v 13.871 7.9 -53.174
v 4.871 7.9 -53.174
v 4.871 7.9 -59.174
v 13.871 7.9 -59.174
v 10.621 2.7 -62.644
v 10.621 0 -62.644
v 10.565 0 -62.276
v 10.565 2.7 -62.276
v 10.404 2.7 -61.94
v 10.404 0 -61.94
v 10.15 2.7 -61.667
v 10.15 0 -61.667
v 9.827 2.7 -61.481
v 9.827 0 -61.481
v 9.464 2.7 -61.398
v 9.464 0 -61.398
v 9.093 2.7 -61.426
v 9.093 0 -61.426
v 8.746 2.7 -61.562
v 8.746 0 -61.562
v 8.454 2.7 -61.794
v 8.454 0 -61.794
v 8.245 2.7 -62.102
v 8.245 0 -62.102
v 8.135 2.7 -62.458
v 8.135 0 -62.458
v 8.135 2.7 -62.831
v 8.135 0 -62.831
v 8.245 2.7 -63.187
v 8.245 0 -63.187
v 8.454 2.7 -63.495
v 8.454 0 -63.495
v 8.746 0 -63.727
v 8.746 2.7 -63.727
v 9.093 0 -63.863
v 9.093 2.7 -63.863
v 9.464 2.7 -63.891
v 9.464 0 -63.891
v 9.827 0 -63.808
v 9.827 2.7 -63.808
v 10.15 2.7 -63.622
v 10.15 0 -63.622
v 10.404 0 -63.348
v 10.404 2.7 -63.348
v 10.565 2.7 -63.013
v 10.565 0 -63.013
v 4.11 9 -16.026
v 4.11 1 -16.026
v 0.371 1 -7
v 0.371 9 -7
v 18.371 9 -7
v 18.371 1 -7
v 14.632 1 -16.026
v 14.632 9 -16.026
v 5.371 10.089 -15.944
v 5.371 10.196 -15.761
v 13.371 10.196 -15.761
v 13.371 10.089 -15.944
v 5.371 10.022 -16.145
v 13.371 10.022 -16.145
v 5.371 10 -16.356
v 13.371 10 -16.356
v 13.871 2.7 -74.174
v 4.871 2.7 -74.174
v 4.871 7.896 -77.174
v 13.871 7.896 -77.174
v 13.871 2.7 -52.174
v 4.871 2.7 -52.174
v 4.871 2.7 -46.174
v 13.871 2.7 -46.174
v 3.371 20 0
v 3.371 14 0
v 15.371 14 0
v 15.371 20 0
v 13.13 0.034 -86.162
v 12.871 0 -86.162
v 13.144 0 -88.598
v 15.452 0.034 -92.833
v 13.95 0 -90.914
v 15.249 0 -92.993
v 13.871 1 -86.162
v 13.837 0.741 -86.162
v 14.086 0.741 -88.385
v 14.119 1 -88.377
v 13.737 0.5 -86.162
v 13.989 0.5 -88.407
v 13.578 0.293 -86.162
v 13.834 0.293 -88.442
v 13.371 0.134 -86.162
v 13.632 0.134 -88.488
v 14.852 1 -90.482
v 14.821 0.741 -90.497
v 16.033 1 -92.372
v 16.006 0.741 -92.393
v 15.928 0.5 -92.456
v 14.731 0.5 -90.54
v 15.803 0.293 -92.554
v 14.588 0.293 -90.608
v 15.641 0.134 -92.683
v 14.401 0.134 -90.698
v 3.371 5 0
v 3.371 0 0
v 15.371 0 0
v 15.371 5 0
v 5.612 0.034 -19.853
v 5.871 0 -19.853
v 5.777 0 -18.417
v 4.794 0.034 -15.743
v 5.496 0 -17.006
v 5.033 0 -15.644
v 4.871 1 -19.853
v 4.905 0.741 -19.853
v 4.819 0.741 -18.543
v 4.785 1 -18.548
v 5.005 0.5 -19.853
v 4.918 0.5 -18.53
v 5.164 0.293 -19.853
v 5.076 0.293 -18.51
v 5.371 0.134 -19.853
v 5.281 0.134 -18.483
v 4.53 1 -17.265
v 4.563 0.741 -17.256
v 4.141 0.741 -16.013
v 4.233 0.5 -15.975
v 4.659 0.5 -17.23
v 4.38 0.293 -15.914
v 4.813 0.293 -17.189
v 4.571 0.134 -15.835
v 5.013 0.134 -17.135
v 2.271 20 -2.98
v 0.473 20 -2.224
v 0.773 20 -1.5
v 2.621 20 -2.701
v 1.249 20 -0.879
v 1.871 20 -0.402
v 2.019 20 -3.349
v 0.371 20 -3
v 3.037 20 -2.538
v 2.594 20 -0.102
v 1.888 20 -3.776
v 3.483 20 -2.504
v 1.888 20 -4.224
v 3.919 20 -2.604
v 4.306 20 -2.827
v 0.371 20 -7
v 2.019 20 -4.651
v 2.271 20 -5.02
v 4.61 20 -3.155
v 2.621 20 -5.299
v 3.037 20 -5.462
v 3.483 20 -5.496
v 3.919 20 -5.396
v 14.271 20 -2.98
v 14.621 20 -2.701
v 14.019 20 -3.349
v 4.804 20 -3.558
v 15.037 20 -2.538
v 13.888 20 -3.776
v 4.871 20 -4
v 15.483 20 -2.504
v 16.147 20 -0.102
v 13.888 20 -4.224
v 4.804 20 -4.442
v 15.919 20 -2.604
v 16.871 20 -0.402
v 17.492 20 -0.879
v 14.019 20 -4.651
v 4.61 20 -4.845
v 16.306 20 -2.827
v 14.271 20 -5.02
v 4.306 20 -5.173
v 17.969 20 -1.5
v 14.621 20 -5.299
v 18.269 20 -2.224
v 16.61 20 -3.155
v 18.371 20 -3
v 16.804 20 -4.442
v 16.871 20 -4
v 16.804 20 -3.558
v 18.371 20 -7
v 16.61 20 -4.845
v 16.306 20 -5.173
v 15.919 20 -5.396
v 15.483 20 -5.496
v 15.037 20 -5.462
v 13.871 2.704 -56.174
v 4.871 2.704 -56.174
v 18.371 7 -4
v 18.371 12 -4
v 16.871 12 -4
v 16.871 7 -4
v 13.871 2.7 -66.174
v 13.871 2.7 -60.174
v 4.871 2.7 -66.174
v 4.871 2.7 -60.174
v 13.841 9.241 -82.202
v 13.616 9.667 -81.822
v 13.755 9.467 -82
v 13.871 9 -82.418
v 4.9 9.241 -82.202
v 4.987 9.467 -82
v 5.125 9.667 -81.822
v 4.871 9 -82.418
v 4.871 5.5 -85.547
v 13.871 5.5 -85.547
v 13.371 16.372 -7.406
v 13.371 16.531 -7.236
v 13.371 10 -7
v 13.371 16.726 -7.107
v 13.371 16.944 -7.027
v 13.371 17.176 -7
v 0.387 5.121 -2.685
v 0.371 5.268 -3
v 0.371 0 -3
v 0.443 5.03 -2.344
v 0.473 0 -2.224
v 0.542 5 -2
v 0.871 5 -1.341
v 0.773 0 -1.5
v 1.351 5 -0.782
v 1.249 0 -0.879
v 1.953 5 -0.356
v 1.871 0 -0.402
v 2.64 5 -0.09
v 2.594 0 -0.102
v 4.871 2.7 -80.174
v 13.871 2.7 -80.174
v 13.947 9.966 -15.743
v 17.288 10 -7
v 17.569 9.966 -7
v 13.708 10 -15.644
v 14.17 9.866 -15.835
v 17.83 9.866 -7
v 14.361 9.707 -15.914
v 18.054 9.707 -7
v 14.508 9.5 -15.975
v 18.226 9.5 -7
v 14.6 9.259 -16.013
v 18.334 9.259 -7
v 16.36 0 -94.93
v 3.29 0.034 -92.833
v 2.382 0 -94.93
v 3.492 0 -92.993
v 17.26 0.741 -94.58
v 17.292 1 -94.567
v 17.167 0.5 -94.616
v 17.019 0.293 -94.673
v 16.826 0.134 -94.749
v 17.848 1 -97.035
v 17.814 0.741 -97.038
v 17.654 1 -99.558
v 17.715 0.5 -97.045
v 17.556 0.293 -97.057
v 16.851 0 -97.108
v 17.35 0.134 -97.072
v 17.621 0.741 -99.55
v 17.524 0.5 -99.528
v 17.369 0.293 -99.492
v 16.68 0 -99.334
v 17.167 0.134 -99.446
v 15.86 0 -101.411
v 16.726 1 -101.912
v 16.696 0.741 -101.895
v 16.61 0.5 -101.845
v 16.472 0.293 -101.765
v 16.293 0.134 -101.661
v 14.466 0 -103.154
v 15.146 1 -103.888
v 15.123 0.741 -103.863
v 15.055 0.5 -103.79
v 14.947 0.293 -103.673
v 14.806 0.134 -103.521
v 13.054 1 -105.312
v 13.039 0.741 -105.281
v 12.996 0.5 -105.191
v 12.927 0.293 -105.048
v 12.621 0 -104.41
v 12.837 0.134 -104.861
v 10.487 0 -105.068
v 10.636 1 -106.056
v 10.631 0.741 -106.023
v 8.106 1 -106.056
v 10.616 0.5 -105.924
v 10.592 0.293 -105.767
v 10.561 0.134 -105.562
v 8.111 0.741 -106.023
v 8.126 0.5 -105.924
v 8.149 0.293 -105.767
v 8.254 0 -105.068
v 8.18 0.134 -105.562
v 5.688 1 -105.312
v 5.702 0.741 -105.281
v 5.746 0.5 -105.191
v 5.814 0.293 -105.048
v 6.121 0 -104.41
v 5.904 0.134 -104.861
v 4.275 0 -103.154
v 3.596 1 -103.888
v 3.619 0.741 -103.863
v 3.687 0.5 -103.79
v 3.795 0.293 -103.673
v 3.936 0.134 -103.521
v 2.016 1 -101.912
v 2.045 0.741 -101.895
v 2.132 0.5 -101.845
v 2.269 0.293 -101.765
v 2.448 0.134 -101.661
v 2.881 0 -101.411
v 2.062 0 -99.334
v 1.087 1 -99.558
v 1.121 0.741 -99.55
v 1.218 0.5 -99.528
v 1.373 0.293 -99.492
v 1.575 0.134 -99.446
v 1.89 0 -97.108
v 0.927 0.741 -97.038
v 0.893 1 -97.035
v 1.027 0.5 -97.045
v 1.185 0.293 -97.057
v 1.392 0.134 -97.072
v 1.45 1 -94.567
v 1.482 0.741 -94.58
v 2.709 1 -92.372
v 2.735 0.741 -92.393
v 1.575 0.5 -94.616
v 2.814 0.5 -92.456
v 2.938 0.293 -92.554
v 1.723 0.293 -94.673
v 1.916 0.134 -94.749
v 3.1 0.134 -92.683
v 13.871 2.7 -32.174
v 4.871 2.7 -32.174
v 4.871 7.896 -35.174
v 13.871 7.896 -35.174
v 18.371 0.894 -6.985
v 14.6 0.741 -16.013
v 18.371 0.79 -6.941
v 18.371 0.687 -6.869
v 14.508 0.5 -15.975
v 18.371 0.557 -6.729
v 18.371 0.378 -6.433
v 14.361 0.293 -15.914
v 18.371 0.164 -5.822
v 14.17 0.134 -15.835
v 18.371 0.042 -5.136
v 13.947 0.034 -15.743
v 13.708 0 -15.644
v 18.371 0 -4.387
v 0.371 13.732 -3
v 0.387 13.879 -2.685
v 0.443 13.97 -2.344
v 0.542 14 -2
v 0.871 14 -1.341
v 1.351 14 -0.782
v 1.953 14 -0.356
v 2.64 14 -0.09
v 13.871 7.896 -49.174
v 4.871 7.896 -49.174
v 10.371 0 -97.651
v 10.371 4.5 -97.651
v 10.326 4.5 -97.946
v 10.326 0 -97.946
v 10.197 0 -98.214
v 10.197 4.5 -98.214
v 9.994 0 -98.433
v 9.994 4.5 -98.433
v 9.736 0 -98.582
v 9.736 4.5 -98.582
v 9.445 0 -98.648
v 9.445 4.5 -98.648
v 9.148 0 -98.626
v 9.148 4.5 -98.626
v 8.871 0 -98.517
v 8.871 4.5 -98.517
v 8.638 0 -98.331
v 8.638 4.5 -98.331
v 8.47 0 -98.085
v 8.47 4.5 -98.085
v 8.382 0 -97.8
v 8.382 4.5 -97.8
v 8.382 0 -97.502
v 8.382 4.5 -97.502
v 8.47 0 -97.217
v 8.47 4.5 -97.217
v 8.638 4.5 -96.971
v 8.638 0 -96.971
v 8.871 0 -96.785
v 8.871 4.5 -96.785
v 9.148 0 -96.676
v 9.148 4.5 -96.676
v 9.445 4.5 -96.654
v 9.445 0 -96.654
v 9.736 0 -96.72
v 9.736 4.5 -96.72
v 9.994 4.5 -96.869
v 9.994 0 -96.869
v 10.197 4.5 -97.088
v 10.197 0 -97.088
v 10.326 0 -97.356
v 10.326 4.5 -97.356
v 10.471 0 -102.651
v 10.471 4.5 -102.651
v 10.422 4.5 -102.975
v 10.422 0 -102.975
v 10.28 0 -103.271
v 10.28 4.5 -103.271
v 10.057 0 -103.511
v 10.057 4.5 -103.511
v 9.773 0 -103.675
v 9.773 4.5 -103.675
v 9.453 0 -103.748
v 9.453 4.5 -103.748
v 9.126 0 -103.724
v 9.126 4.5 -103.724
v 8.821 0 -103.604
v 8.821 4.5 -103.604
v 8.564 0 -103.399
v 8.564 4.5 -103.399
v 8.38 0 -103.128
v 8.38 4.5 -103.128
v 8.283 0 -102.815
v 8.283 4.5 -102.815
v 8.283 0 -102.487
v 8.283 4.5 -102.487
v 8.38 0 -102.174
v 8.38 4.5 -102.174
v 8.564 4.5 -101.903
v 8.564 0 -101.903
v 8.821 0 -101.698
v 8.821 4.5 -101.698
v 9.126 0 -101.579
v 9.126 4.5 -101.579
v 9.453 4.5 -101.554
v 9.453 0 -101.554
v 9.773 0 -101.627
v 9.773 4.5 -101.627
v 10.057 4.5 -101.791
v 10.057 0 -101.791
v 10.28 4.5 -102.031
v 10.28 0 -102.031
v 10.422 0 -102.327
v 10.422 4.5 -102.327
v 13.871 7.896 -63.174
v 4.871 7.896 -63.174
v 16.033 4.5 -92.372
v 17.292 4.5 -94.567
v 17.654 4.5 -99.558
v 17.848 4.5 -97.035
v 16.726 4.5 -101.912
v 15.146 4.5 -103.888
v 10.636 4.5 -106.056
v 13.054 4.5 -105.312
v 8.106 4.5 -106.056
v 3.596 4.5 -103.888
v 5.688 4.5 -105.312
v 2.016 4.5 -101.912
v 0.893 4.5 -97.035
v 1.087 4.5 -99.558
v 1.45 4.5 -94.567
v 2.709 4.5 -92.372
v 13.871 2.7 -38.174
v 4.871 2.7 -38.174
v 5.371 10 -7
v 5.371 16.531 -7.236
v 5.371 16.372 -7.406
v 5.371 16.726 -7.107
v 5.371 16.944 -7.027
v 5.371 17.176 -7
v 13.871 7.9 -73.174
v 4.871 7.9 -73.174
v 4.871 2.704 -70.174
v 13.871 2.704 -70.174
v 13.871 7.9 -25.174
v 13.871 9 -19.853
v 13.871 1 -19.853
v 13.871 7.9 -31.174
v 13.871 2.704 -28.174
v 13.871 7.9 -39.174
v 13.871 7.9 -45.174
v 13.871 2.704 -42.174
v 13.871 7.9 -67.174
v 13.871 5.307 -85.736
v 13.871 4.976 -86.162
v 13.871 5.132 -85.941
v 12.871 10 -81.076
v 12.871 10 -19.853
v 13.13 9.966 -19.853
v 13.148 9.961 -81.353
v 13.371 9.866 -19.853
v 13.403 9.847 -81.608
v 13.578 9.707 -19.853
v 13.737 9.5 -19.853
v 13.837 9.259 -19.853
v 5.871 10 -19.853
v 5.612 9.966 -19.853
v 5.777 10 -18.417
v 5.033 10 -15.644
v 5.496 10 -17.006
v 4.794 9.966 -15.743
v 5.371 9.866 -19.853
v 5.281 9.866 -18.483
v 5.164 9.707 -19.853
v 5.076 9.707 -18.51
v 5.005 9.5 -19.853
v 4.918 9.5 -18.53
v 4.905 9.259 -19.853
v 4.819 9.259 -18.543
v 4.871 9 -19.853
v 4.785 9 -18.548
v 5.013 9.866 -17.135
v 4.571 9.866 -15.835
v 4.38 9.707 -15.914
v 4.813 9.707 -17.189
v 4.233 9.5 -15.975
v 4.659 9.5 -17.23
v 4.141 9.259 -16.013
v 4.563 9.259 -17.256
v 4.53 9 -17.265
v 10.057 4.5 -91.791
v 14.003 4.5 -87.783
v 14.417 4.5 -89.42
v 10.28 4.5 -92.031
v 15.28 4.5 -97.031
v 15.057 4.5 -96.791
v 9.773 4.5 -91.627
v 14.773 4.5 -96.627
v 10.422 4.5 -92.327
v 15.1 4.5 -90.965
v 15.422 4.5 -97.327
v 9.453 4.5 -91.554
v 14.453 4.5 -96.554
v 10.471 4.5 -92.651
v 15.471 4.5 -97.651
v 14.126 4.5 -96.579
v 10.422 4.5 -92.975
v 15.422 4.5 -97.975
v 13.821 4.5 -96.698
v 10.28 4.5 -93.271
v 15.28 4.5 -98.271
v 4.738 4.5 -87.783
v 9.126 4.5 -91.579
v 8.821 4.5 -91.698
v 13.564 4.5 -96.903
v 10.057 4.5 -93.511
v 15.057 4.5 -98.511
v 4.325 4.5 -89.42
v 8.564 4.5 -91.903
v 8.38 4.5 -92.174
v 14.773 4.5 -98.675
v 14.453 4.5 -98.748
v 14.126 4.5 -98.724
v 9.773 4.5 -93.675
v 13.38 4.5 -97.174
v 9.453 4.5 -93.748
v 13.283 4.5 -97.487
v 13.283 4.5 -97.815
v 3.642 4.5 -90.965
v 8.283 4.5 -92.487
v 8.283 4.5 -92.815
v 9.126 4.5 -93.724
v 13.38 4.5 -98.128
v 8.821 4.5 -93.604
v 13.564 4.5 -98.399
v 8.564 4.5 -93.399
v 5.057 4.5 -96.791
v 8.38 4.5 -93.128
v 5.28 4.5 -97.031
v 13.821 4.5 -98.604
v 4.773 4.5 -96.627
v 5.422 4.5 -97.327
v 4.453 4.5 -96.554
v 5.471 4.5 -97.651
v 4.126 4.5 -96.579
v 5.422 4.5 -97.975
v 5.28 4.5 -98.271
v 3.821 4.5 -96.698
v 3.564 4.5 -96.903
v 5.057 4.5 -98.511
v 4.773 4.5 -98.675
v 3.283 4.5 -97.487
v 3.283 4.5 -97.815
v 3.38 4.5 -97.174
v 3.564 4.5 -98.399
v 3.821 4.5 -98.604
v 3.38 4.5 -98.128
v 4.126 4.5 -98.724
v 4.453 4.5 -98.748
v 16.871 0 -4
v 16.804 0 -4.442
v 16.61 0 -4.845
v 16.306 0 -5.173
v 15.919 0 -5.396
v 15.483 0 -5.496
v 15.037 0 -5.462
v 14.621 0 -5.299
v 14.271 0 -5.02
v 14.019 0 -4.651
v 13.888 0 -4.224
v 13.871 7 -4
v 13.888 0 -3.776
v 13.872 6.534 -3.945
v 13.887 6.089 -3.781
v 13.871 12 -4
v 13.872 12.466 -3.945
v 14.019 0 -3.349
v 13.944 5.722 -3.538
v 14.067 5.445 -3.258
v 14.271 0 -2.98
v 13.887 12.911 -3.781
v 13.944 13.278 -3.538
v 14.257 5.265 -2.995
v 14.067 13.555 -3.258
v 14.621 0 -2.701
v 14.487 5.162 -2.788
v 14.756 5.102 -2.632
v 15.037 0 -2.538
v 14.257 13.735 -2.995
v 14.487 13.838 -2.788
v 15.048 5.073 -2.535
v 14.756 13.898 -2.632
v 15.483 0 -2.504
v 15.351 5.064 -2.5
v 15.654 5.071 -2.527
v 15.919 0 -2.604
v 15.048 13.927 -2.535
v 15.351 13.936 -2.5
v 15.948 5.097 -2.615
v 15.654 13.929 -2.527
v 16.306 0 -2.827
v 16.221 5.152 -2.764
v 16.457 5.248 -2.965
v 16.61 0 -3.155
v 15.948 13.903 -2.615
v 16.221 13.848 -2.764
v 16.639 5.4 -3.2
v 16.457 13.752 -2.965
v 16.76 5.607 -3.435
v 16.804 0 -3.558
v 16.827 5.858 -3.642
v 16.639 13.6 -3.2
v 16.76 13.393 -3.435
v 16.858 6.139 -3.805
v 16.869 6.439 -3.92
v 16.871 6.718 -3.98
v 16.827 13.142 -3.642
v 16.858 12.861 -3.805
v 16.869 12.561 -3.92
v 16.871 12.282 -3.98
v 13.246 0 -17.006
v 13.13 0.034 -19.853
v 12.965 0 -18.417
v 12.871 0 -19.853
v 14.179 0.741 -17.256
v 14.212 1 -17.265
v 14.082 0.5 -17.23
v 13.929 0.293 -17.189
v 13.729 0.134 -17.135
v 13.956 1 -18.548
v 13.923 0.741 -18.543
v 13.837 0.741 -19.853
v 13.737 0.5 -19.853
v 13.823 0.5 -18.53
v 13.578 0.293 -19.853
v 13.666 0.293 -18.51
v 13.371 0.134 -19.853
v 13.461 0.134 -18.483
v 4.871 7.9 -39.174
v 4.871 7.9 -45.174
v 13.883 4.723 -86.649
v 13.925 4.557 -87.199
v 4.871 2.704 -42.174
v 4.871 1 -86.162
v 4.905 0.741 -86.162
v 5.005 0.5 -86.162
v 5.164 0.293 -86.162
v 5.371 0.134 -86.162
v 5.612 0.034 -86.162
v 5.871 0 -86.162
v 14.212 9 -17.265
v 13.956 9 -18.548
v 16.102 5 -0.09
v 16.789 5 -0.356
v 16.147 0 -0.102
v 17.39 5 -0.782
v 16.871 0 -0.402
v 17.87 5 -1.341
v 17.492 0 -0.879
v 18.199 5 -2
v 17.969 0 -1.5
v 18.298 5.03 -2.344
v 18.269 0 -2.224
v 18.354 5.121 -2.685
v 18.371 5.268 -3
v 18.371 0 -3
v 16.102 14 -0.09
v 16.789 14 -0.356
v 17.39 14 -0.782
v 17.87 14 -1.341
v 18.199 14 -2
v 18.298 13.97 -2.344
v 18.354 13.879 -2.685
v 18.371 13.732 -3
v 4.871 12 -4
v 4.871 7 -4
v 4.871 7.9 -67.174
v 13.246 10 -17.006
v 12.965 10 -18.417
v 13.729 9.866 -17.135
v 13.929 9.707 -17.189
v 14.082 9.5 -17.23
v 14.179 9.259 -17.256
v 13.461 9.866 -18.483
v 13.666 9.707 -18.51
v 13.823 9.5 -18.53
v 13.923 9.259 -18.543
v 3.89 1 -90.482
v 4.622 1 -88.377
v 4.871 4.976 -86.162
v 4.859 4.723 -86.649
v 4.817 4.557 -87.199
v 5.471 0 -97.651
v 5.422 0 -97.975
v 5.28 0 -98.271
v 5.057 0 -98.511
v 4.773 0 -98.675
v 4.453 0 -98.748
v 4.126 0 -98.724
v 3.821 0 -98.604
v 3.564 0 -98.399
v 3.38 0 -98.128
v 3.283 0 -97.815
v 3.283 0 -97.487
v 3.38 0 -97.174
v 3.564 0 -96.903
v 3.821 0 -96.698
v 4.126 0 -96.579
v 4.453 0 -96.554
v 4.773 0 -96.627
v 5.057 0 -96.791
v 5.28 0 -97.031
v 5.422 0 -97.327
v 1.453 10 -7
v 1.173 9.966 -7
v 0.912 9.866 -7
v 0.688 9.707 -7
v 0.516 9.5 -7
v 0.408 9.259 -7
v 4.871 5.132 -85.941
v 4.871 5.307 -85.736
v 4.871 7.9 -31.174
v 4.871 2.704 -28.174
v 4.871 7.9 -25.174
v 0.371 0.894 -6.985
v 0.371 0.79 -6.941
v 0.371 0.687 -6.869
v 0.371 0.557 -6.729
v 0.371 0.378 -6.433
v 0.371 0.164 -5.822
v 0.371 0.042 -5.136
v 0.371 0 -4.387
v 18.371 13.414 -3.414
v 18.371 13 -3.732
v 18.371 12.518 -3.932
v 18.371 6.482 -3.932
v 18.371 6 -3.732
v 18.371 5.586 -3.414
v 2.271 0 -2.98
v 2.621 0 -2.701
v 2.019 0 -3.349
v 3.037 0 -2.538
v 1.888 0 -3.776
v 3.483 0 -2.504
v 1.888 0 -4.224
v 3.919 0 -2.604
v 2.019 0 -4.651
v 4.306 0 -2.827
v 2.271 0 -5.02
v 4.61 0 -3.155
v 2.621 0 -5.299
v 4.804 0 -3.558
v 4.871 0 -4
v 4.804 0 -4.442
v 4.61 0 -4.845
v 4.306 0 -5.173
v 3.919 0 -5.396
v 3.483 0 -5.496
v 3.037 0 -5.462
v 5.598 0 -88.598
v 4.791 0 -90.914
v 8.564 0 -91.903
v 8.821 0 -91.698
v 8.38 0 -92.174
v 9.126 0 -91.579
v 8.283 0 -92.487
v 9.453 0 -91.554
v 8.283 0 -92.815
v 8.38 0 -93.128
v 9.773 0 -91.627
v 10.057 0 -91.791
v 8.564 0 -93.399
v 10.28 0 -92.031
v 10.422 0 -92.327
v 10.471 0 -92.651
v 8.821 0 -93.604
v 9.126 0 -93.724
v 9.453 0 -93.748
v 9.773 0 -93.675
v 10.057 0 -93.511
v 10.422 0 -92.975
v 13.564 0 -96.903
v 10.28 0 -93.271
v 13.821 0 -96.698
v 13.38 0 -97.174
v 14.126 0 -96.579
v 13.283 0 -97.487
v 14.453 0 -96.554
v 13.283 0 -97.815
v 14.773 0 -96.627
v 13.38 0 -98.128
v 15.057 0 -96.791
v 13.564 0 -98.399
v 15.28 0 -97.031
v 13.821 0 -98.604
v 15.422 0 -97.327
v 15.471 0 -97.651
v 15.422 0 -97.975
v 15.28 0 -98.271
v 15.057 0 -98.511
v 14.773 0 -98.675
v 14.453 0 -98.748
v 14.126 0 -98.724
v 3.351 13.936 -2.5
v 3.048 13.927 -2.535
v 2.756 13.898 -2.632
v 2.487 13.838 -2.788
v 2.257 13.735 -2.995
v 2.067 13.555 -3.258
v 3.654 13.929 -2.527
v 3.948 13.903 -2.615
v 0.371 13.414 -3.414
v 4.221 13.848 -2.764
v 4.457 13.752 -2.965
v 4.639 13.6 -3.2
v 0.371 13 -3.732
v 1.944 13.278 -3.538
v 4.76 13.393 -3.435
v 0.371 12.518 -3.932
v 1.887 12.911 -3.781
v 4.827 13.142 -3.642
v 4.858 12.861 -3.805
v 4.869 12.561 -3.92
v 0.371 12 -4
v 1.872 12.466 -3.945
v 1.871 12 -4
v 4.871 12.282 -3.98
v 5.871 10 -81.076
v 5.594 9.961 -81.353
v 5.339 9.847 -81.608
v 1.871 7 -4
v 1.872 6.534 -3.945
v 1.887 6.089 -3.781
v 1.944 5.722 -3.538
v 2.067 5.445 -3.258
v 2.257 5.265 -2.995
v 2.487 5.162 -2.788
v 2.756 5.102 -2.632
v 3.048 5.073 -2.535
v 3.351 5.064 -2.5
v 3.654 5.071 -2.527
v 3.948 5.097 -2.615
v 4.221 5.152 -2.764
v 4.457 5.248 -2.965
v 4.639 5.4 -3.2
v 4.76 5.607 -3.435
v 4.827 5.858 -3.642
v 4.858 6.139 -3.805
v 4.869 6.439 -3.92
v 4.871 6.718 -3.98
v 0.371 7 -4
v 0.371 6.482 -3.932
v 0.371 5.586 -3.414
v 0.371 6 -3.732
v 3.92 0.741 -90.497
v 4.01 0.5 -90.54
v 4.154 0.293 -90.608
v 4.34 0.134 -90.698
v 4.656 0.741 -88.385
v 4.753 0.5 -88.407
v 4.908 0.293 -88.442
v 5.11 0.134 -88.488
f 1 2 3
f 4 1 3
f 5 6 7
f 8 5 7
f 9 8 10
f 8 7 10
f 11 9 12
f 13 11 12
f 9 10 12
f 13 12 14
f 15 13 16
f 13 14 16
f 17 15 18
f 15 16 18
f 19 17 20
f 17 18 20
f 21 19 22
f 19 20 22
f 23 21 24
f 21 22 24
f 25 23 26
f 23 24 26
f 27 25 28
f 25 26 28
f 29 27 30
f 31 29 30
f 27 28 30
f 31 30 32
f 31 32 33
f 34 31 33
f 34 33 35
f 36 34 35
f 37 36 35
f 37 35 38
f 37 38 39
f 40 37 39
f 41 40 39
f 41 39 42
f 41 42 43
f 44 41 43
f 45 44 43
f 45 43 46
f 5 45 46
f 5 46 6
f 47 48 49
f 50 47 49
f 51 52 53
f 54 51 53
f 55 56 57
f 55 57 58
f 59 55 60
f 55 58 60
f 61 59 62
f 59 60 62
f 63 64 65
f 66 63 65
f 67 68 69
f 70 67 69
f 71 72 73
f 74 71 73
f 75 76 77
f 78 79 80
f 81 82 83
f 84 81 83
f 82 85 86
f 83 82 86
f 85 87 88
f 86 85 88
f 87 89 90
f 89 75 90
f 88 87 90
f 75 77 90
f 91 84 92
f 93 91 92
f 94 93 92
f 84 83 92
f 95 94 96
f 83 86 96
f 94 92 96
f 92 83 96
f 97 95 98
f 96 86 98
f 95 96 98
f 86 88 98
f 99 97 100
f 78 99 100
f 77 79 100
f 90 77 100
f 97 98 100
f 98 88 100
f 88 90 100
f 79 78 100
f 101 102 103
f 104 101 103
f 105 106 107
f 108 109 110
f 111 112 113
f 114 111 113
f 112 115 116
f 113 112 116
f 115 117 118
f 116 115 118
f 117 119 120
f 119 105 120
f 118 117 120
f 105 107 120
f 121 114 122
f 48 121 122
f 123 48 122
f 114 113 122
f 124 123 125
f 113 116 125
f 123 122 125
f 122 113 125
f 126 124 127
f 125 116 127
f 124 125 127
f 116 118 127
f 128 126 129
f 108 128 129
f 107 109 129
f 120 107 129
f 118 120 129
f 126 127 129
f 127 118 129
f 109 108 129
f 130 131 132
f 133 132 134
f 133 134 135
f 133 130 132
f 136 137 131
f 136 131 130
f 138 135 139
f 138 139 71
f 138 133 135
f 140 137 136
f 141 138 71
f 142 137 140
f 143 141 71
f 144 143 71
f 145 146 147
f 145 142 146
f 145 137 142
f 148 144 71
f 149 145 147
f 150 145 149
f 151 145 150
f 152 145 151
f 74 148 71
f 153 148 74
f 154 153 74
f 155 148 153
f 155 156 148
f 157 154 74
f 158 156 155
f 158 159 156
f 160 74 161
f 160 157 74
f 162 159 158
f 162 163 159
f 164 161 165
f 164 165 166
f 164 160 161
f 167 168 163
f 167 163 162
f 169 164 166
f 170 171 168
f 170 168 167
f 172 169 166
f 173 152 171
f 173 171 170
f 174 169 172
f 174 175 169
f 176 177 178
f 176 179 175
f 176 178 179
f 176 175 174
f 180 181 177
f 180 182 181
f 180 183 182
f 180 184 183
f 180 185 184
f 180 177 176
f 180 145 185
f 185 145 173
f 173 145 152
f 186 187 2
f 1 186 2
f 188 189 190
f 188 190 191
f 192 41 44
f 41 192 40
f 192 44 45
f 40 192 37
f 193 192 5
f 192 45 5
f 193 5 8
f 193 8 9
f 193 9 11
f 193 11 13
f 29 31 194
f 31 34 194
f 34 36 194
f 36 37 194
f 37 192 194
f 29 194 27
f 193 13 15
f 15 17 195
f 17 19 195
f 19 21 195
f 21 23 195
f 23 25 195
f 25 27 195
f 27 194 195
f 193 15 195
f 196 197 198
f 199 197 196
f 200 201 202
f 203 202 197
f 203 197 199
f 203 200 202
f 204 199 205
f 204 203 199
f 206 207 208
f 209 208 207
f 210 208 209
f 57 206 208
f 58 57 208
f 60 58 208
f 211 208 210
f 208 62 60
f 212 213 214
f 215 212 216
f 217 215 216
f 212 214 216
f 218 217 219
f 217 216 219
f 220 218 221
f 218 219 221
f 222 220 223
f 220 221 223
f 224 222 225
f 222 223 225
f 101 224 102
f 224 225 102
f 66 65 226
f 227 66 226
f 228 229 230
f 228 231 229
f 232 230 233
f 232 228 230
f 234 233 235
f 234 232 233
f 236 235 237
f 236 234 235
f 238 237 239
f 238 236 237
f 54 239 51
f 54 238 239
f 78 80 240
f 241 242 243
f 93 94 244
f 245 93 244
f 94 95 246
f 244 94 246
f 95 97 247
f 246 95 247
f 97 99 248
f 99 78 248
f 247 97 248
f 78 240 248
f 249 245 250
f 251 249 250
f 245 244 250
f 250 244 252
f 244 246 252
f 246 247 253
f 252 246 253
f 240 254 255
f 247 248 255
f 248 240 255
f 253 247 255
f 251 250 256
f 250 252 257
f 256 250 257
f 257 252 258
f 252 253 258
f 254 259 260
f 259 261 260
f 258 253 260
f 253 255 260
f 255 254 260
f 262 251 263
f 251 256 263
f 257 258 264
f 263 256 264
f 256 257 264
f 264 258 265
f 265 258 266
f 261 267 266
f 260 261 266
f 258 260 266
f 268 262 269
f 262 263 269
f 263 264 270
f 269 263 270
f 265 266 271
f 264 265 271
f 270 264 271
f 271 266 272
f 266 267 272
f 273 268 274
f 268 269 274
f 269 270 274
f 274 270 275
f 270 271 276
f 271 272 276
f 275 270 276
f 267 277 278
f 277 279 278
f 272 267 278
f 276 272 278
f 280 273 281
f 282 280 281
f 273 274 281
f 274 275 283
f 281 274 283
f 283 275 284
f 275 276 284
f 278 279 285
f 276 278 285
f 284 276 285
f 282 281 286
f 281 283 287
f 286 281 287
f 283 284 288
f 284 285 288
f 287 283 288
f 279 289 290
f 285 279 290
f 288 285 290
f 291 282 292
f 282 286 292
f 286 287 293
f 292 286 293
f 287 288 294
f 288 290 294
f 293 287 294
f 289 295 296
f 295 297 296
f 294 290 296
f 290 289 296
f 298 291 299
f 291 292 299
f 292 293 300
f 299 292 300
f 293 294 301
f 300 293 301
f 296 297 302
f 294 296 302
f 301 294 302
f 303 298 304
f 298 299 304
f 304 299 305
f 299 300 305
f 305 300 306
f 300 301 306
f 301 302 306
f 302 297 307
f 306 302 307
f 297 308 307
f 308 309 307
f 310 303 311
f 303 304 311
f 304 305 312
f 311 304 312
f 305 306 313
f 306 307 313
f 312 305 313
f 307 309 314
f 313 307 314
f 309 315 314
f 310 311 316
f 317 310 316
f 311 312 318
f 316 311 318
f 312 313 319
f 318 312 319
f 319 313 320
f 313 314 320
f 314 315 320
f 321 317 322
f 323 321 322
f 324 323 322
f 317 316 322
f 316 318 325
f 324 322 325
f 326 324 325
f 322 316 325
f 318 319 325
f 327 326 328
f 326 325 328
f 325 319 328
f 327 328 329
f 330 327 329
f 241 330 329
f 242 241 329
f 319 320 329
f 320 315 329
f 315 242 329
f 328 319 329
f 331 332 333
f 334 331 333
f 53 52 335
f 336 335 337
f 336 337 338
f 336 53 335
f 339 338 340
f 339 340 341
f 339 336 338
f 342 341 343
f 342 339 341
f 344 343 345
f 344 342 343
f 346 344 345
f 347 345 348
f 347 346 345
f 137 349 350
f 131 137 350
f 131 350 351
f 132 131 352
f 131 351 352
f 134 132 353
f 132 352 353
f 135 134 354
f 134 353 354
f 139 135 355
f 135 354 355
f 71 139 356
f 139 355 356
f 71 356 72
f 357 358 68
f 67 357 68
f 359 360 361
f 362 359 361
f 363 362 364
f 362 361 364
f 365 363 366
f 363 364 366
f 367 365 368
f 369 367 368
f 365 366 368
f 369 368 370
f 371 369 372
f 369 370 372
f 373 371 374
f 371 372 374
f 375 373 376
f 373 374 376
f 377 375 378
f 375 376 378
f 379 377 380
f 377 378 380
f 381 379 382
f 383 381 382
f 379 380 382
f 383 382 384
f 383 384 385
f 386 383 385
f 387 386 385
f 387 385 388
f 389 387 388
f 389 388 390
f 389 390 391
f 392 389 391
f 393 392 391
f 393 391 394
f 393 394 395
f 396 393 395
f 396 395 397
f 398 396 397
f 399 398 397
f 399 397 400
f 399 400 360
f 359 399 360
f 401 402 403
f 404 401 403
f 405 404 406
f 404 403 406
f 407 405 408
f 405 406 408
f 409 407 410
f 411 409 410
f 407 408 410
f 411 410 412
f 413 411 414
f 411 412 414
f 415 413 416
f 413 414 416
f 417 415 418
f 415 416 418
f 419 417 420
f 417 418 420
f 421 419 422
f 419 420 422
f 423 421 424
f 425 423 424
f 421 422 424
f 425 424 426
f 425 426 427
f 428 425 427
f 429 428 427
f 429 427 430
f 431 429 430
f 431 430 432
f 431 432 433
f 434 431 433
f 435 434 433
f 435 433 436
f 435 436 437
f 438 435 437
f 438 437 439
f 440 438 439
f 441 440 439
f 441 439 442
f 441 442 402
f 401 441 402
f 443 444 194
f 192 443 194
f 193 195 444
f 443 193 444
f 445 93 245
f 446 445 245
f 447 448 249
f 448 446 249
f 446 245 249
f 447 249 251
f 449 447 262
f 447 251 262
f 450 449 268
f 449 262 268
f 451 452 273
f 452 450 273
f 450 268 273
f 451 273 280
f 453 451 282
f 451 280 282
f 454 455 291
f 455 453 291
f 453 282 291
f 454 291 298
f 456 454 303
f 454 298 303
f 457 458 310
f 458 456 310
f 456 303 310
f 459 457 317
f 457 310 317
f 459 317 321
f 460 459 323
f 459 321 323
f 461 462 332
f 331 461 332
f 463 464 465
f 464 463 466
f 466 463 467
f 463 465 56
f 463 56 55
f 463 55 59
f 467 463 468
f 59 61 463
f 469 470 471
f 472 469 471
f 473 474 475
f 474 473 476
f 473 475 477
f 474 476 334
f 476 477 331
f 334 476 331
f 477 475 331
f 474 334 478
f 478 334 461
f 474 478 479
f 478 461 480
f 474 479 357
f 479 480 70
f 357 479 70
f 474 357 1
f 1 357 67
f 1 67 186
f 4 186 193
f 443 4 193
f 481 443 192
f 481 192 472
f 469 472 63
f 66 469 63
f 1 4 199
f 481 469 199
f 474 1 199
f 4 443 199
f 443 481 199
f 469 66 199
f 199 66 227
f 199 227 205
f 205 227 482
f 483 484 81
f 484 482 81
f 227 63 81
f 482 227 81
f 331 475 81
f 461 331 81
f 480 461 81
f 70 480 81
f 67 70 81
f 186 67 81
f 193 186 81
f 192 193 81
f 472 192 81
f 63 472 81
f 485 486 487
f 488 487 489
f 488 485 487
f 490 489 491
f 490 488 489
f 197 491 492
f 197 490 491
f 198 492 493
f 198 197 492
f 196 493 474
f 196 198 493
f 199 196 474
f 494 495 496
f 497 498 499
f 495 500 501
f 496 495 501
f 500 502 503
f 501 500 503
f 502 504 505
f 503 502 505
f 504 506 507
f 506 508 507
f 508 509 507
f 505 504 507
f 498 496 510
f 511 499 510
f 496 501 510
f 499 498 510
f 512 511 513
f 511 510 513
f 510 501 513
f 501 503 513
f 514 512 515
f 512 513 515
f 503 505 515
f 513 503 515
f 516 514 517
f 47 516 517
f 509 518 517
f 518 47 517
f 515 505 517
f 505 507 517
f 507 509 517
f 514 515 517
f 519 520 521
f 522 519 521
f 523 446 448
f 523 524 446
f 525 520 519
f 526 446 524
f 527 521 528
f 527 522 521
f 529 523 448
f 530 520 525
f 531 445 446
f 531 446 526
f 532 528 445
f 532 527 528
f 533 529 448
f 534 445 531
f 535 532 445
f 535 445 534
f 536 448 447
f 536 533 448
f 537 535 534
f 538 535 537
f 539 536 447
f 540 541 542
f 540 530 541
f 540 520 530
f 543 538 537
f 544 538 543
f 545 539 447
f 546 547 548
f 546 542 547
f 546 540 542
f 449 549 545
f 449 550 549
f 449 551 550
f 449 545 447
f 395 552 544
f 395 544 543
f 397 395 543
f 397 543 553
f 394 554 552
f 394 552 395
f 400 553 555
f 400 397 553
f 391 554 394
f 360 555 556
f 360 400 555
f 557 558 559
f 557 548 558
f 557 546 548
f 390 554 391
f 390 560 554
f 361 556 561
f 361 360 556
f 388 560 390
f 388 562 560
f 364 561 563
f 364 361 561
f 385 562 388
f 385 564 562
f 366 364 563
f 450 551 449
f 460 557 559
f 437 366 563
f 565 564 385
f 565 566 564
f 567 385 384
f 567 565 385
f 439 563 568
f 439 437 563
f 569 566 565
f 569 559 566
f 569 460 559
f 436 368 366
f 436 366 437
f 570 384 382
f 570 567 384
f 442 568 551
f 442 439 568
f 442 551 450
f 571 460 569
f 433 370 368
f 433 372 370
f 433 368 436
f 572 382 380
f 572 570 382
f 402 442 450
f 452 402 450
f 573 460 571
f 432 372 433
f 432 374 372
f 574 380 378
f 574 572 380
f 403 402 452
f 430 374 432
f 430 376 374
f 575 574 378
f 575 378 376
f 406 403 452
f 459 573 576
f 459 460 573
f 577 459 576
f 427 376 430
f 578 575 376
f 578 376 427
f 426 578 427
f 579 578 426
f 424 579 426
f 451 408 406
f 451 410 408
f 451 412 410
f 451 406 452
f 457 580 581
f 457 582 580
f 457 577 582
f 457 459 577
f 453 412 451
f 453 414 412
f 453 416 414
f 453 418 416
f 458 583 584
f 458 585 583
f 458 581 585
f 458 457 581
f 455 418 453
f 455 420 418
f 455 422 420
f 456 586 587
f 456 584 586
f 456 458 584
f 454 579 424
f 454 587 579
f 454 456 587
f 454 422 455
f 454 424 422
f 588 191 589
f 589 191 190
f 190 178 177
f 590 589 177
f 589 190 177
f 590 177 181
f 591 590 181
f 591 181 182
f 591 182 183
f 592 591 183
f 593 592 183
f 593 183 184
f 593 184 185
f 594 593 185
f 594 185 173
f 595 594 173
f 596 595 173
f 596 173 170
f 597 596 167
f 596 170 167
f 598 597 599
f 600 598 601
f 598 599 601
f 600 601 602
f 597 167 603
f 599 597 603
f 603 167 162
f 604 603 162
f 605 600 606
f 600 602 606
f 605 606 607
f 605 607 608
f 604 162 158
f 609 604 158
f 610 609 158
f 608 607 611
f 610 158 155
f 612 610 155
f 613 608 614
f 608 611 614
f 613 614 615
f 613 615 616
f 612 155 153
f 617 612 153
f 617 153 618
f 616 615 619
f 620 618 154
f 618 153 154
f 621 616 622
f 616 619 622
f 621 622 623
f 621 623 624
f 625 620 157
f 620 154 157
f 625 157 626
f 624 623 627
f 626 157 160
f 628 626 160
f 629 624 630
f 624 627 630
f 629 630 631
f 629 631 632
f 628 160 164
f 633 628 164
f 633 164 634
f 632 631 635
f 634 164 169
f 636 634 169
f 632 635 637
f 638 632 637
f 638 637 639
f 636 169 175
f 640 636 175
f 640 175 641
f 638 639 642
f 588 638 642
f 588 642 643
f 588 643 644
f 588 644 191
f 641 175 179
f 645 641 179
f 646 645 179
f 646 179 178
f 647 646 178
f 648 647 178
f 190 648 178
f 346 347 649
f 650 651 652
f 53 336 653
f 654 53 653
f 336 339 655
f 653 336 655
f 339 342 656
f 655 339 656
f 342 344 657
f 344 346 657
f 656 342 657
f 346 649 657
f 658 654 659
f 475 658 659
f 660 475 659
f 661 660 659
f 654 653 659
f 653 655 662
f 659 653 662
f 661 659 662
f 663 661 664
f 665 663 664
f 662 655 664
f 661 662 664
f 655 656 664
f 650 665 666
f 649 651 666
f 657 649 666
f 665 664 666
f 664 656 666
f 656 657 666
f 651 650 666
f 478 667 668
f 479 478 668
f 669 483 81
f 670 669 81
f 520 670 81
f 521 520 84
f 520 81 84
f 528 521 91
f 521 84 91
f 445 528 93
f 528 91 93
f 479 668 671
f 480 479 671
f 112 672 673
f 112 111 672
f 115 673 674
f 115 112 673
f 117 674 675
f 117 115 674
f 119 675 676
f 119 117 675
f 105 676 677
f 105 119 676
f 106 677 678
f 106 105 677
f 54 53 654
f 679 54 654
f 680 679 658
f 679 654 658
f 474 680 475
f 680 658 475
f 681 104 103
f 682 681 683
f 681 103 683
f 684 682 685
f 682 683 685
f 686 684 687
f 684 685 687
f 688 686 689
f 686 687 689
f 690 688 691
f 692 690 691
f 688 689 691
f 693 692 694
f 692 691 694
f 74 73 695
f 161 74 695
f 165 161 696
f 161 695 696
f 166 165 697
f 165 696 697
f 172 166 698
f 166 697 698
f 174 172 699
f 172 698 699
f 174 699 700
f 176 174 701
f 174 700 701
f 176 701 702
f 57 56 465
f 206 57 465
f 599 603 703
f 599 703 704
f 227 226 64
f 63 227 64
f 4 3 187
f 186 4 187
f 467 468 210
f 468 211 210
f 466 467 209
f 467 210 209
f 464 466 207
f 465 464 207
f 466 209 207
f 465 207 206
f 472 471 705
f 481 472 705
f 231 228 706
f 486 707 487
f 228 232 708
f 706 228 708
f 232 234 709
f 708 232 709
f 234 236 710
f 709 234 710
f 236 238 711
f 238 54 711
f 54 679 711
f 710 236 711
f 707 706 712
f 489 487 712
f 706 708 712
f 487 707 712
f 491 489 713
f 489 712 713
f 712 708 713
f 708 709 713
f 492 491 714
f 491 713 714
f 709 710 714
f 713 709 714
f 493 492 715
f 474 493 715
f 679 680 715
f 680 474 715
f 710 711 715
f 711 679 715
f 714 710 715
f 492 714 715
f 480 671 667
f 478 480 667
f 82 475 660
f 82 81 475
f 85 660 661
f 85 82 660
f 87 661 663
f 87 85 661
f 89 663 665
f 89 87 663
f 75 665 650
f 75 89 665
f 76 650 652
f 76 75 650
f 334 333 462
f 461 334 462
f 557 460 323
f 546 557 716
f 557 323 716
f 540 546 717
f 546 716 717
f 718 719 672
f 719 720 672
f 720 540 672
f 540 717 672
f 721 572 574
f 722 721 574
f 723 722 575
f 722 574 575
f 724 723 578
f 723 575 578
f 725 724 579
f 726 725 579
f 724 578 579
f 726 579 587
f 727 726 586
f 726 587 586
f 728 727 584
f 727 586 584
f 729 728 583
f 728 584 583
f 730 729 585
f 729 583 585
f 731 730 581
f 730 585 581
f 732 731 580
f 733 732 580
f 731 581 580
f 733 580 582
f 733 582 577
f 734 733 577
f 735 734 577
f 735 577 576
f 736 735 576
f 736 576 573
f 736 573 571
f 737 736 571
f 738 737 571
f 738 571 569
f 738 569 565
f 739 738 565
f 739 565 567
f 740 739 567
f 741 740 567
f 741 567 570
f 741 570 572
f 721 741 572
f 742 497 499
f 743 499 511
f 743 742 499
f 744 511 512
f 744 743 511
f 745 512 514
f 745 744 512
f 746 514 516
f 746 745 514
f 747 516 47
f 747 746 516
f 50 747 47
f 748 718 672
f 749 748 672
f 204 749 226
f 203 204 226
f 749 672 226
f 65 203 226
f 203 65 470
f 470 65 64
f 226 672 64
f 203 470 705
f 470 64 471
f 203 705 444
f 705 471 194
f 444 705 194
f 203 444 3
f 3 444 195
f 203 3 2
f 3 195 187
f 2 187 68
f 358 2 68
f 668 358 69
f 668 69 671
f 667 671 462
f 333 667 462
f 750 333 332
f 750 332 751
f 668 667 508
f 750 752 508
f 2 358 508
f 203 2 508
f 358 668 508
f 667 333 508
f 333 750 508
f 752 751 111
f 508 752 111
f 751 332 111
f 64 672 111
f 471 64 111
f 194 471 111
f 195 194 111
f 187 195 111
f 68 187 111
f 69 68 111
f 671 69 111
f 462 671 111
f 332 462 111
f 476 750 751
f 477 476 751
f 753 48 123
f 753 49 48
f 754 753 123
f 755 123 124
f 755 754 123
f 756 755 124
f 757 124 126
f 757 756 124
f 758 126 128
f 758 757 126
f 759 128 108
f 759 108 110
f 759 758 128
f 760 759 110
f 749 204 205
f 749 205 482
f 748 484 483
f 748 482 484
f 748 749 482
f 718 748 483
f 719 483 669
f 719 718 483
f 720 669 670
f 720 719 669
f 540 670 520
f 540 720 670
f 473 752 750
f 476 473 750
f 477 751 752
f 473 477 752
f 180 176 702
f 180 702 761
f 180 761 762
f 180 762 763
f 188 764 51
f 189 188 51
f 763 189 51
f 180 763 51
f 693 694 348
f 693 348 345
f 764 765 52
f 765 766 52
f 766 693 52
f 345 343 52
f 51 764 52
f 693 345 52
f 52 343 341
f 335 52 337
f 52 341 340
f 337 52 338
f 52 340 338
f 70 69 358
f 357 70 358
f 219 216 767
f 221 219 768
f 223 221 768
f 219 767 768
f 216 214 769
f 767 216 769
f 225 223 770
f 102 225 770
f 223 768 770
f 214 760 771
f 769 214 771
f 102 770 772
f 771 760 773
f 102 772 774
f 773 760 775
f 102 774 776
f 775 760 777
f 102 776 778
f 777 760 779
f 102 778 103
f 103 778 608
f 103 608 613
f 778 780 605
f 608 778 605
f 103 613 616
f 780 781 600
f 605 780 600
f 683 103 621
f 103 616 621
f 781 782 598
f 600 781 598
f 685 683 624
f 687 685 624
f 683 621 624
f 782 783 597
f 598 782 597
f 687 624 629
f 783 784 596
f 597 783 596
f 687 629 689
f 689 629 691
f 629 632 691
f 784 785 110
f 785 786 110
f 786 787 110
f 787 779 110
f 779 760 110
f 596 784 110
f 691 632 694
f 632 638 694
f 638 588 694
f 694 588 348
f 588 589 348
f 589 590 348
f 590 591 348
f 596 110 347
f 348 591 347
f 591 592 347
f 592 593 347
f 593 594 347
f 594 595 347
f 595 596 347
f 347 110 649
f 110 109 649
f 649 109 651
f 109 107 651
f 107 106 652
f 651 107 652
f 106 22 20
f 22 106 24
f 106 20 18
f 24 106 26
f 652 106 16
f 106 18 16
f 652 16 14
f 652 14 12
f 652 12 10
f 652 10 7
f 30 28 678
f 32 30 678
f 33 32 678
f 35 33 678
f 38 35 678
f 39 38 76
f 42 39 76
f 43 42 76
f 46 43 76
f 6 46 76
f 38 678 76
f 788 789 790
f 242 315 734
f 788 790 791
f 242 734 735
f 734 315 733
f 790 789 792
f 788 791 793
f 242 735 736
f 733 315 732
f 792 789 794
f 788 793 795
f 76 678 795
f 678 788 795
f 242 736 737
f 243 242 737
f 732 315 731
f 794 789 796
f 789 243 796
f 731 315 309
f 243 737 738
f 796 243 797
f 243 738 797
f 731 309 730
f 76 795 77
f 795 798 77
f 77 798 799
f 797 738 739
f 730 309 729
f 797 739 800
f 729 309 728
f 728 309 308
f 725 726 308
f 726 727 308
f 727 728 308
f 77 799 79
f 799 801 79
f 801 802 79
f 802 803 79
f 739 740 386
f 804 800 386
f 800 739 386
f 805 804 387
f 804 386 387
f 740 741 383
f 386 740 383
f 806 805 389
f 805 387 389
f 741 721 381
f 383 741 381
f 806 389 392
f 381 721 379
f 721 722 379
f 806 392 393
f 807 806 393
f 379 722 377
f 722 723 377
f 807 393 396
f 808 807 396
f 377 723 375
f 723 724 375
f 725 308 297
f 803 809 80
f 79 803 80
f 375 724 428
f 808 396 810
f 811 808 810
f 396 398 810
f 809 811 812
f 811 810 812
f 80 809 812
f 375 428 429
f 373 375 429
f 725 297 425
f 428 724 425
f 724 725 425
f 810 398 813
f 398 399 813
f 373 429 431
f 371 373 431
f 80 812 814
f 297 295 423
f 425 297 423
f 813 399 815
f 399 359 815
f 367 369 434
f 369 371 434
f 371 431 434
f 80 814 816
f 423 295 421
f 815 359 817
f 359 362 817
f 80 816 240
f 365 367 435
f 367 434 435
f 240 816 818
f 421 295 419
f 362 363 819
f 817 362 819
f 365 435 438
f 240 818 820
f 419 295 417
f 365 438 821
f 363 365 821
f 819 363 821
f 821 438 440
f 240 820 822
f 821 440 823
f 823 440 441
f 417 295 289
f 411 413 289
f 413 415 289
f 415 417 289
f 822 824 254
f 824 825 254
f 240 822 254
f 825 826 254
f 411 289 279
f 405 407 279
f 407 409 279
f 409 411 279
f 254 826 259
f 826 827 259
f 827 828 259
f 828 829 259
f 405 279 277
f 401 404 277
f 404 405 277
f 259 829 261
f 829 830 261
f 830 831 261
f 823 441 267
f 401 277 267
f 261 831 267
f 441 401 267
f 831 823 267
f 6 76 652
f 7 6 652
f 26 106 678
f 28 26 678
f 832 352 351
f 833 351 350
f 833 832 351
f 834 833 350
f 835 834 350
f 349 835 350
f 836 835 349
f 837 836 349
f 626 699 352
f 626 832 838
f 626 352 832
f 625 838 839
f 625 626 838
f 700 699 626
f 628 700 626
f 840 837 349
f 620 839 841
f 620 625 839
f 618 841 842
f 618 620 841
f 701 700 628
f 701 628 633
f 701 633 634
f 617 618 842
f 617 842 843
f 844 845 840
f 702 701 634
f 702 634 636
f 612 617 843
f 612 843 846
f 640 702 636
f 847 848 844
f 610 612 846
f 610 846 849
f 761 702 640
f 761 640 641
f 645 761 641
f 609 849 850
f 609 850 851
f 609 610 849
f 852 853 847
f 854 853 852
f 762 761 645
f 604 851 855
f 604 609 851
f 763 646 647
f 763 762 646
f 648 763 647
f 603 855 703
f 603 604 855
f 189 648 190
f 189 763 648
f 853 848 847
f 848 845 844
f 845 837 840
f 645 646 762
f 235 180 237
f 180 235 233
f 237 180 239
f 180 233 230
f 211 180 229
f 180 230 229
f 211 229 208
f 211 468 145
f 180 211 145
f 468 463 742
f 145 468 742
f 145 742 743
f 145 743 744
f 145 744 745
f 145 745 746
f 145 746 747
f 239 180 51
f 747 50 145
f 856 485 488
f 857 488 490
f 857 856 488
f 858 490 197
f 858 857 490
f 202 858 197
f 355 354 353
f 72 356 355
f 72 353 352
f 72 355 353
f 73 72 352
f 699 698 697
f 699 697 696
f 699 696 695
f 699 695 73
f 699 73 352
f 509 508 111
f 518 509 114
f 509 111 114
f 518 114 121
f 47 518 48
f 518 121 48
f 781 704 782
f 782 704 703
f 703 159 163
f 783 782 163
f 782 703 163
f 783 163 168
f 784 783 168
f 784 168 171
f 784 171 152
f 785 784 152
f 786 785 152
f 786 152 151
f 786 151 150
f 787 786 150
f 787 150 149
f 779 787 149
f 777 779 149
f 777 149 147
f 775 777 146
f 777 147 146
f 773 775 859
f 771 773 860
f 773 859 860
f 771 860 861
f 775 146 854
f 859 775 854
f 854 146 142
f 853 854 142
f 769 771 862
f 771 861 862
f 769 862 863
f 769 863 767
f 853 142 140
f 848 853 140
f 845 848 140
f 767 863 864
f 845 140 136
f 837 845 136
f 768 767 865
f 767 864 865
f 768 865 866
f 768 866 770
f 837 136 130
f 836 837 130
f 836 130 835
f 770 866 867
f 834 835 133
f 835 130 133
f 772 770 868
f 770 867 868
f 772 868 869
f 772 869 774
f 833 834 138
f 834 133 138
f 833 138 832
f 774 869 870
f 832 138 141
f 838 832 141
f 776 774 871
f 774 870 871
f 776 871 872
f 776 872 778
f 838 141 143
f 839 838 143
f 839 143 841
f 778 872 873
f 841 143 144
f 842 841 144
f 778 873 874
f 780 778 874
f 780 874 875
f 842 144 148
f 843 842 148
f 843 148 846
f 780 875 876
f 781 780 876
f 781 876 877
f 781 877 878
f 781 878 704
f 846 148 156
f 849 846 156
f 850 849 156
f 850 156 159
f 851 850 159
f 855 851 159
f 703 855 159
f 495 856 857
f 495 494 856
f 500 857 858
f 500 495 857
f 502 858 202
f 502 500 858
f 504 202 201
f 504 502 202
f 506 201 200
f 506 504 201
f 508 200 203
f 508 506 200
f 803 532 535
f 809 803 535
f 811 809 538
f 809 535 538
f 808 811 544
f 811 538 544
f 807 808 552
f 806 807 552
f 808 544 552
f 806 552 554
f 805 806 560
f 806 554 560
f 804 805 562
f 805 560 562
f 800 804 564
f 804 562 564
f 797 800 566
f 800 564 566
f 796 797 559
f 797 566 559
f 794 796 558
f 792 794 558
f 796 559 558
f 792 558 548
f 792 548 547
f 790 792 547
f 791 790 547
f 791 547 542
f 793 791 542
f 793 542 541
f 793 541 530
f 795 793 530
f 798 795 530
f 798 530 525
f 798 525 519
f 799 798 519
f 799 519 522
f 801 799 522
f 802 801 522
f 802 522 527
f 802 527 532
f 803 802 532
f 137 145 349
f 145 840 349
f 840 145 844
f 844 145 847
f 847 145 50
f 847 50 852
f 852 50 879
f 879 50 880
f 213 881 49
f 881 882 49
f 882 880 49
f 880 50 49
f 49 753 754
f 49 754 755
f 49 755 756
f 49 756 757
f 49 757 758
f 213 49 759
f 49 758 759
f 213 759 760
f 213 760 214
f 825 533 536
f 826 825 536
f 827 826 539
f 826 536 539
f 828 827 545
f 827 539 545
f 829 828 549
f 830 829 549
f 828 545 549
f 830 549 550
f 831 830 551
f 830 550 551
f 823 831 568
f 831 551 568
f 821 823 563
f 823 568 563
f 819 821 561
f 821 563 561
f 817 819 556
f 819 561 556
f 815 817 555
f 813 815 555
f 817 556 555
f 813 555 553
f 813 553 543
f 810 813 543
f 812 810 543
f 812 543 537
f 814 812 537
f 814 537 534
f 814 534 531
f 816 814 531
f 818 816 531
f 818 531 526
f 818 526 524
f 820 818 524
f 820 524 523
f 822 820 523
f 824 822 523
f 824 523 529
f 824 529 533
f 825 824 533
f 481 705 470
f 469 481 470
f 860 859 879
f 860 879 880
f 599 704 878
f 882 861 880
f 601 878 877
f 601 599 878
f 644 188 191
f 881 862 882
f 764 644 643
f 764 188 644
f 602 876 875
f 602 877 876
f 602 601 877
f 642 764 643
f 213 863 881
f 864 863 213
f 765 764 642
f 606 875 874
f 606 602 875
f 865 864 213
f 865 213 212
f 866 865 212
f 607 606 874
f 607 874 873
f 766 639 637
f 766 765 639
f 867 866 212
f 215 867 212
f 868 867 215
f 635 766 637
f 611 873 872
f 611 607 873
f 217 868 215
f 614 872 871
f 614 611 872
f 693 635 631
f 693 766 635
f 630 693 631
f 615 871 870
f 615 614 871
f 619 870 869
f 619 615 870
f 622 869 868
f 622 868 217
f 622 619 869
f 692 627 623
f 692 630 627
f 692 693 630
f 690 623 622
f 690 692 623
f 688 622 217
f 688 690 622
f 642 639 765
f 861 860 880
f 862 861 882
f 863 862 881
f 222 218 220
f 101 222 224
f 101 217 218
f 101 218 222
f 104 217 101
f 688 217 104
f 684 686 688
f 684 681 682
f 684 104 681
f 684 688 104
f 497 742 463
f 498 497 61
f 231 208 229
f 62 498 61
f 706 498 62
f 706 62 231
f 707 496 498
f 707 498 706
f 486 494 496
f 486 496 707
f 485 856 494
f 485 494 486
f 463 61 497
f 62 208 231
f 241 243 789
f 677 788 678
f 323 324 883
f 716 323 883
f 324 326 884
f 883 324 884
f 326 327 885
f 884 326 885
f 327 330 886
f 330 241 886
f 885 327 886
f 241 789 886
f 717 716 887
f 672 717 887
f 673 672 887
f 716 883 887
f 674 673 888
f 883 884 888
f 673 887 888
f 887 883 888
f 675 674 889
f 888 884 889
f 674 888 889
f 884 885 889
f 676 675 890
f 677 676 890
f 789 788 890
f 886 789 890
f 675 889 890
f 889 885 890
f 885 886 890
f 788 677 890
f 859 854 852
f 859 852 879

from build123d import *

# Parameters (mm, degrees)
BOSS_EXTRUDE1_DEPTH     = 10
CUT_EXTRUDE1_DEPTH      = 19.370764901
CUT_EXTRUDE1_DEPTH_BACK = 1
SKETCH3_R               = 1
SKETCH3_R_2             = 1.1
CUT_EXTRUDE2_DEPTH      = 6.5
CUT_EXTRUDE2_DEPTH_BACK = 5.5000001
BOSS_EXTRUDE2_DEPTH     = 10
SKETCH5_R               = 1.5
CUT_EXTRUDE3_DEPTH      = 21.0000001
CUT_EXTRUDE4_DEPTH      = 19
CUT_EXTRUDE5_DEPTH      = 14.5000001
BOSS_EXTRUDE3_START     = -5
BOSS_EXTRUDE3_DEPTH     = 8
FILLET2_R               = 1
FILLET3_R               = 1
SKETCH11_R              = 1.25
CUT_EXTRUDE12_DEPTH     = 4


with BuildPart() as part:
    # Sketch1 → Boss-Extrude1 (new body)
    with BuildSketch(Plane(origin=(0, 0, 0), x_dir=(1, 0, 0), z_dir=(0, 1, 0))):
        with BuildLine():
            Line((3.370764901, 0), (15.370764901, 0))
            ThreePointArc((15.370764901, 0), (17.492085245, 0.878679656), (18.370764901, 3))
            Line((18.370764901, 3), (18.370764901, 7))
            Line((18.370764901, 7), (14.631969576, 16.026250381))
            ThreePointArc((14.631969576, 16.026250381), (14.062912097, 17.902181484), (13.870764901, 19.853084704))
            Line((13.870764901, 19.853084704), (13.870764901, 86.161977258))
            ThreePointArc((13.870764901, 86.161977258), (14.426762085, 89.449957004), (16.032927063, 92.372315254))
            ThreePointArc((16.032927063, 92.372315254), (9.370764901, 106.151102551), (2.708602739, 92.372315254))
            ThreePointArc((2.708602739, 92.372315254), (4.314767717, 89.449957004), (4.870764901, 86.161977258))
            Line((4.870764901, 86.161977258), (4.870764901, 19.853084704))
            ThreePointArc((4.870764901, 19.853084704), (4.678617705, 17.902181484), (4.109560226, 16.026250381))
            Line((4.109560226, 16.026250381), (0.370764901, 7))
            Line((0.370764901, 7), (0.370764901, 3))
            ThreePointArc((0.370764901, 3), (1.249444558, 0.878679656), (3.370764901, 0))
        make_face()
    extrude(amount=BOSS_EXTRUDE1_DEPTH)

    # Sketch2 → Cut-Extrude1 (cut, two sides)
    with BuildSketch(Plane(origin=(0, 0, 0), x_dir=(0, 0, -1), z_dir=(1, 0, 0))) as cut_extrude1_sk:
        with BuildLine():
            Line((79.695640218, 12.044389059), (85.546639403, 5.500402589))
            ThreePointArc((85.546639403, 5.500402589), (86.558076021, 4.761497468), (87.783067402, 4.5))
            Line((87.783067402, 4.5), (106.151102551, 4.5))
            Line((106.151102551, 4.5), (106.151102551, 14.134482691))
            Line((106.151102551, 14.134482691), (79.695640218, 14.134482691))
            Line((79.695640218, 14.134482691), (79.695640218, 12.044389059))
        make_face()
    extrude(amount=CUT_EXTRUDE1_DEPTH, mode=Mode.SUBTRACT)
    extrude(cut_extrude1_sk.sketch, amount=-CUT_EXTRUDE1_DEPTH_BACK, mode=Mode.SUBTRACT)

    # Sketch3 → Cut-Extrude2 (cut, two sides)
    with BuildSketch(Plane(origin=(0, 4.5, 0), x_dir=(1, 0, 0), z_dir=(0, 1, 0))) as cut_extrude2_sk:
        with Locations((9.370764901, 97.651102551)):
            Circle(SKETCH3_R)
        with Locations((9.370764901, 102.651102551)):
            Circle(SKETCH3_R_2)
        with Locations((14.370764901, 97.651102551)):
            Circle(SKETCH3_R_2)
        with Locations((9.370764901, 92.651102551)):
            Circle(SKETCH3_R_2)
        with Locations((4.370764901, 97.651102551)):
            Circle(SKETCH3_R_2)
    extrude(amount=CUT_EXTRUDE2_DEPTH, mode=Mode.SUBTRACT)
    extrude(cut_extrude2_sk.sketch, amount=-CUT_EXTRUDE2_DEPTH_BACK, mode=Mode.SUBTRACT)

    # Sketch4 → Boss-Extrude2 (add)
    with BuildSketch(Plane(origin=(0, 10, 0), x_dir=(1, 0, 0), z_dir=(0, 1, 0))):
        with BuildLine():
            Line((18.370764901, 7), (0.370764901, 7))
            Line((0.370764901, 7), (0.370764901, 3))
            ThreePointArc((0.370764901, 3), (1.249444558, 0.878679656), (3.370764901, 0))
            Line((3.370764901, 0), (15.370764901, 0))
            ThreePointArc((15.370764901, 0), (17.492085245, 0.878679656), (18.370764901, 3))
            Line((18.370764901, 3), (18.370764901, 7))
        make_face()
    extrude(amount=BOSS_EXTRUDE2_DEPTH)

    # Sketch5 → Cut-Extrude3 (cut, through all)
    with BuildSketch(Plane(origin=(0, 20, 0), x_dir=(1, 0, 0), z_dir=(0, 1, 0))):
        with Locations((3.370764901, 4)):
            Circle(SKETCH5_R)
        with Locations((15.370764901, 4)):
            Circle(SKETCH5_R)
    extrude(amount=-CUT_EXTRUDE3_DEPTH, mode=Mode.SUBTRACT)

    # Sketch6 → Cut-Extrude4 (cut, through all)
    with BuildSketch(Plane(origin=(18.370764901, 0, 0), x_dir=(0, 0, -1), z_dir=(1, 0, 0))):
        with BuildLine():
            Line((0, 14), (2, 14))
            ThreePointArc((2, 14), (3.414213562, 13.414213562), (4, 12))
            Line((4, 12), (4, 7))
            ThreePointArc((4, 7), (3.414213562, 5.585786438), (2, 5))
            Line((2, 5), (0, 5))
            Line((0, 5), (0, 14))
        make_face()
    extrude(amount=-CUT_EXTRUDE4_DEPTH, mode=Mode.SUBTRACT)

    # Sketch7 → Cut-Extrude5 (cut, through all)
    with BuildSketch(Plane.ZY.offset(-4.870764901)):
        Polygon((-77.173535, 7.896152423), (-80.173535, 2.7), (-74.173535, 2.7), align=None)
        Polygon((-73.173535, 7.9), (-70.173535, 2.703847577), (-67.173535, 7.9), align=None)
        Polygon((-63.173535, 7.896152423), (-66.173535, 2.7), (-60.173535, 2.7), align=None)
        Polygon((-59.173535, 7.9), (-56.173535, 2.703847577), (-53.173535, 7.9), align=None)
        Polygon((-49.173535, 7.896152423), (-52.173535, 2.7), (-46.173535, 2.7), align=None)
        Polygon((-45.173535, 7.9), (-42.173535, 2.703847577), (-39.173535, 7.9), align=None)
        Polygon((-35.173535, 7.896152423), (-38.173535, 2.7), (-32.173535, 2.7), align=None)
        Polygon((-31.173535, 7.9), (-28.173535, 2.703847577), (-25.173535, 7.9), align=None)
    extrude(amount=-CUT_EXTRUDE5_DEPTH, mode=Mode.SUBTRACT)

    # Sketch9 → Boss-Extrude3 (add)
    with BuildSketch(Plane.ZY.offset(-0.370764901).offset(BOSS_EXTRUDE3_START)):
        Polygon((-7, 16.671459489), (-7, 10), (-16.026250381, 10), align=None)
    extrude(amount=-BOSS_EXTRUDE3_DEPTH)

    # Fillet2
    fillet2_edges = [part.edges().sort_by_distance(p)[0] for p in [
        (16.501367239, 0, -11.51312519),
        (2.240162564, 0, -11.51312519),
        (4.678617705, 0, -17.902181484),
        (4.870764901, 0, -53.007530981),
        (4.314767717, 0, -89.449957004),
        (9.370764901, 0, -106.151102551),
        (14.426762085, 0, -89.449957004),
        (13.870764901, 0, -53.007530981),
        (14.062912097, 0, -17.902181484),
        (4.678617705, 10, -17.902181484),
        (2.240162564, 10, -11.51312519),
        (4.870764901, 10, -50.688309852),
        (9.370764901, 10, -81.523535),
        (14.062912097, 10, -17.902181484),
        (16.501367239, 10, -11.51312519),
        (13.870764901, 10, -50.688309852),
    ]]
    fillet(fillet2_edges, radius=FILLET2_R)

    # Fillet3
    fillet3_edges = [part.edges().sort_by_distance(p)[0] for p in [
        (9.370764901, 10, -16.026250381),
        (9.370764901, 16.671459489, -7),
    ]]
    fillet(fillet3_edges, radius=FILLET3_R)

    # Sketch11 → Cut-Extrude12 (cut)
    with BuildSketch(Plane.XZ):
        with Locations((9.370764901, -62.644330493)):
            Circle(SKETCH11_R)
    extrude(amount=-CUT_EXTRUDE12_DEPTH, mode=Mode.SUBTRACT)


solid = part.part
